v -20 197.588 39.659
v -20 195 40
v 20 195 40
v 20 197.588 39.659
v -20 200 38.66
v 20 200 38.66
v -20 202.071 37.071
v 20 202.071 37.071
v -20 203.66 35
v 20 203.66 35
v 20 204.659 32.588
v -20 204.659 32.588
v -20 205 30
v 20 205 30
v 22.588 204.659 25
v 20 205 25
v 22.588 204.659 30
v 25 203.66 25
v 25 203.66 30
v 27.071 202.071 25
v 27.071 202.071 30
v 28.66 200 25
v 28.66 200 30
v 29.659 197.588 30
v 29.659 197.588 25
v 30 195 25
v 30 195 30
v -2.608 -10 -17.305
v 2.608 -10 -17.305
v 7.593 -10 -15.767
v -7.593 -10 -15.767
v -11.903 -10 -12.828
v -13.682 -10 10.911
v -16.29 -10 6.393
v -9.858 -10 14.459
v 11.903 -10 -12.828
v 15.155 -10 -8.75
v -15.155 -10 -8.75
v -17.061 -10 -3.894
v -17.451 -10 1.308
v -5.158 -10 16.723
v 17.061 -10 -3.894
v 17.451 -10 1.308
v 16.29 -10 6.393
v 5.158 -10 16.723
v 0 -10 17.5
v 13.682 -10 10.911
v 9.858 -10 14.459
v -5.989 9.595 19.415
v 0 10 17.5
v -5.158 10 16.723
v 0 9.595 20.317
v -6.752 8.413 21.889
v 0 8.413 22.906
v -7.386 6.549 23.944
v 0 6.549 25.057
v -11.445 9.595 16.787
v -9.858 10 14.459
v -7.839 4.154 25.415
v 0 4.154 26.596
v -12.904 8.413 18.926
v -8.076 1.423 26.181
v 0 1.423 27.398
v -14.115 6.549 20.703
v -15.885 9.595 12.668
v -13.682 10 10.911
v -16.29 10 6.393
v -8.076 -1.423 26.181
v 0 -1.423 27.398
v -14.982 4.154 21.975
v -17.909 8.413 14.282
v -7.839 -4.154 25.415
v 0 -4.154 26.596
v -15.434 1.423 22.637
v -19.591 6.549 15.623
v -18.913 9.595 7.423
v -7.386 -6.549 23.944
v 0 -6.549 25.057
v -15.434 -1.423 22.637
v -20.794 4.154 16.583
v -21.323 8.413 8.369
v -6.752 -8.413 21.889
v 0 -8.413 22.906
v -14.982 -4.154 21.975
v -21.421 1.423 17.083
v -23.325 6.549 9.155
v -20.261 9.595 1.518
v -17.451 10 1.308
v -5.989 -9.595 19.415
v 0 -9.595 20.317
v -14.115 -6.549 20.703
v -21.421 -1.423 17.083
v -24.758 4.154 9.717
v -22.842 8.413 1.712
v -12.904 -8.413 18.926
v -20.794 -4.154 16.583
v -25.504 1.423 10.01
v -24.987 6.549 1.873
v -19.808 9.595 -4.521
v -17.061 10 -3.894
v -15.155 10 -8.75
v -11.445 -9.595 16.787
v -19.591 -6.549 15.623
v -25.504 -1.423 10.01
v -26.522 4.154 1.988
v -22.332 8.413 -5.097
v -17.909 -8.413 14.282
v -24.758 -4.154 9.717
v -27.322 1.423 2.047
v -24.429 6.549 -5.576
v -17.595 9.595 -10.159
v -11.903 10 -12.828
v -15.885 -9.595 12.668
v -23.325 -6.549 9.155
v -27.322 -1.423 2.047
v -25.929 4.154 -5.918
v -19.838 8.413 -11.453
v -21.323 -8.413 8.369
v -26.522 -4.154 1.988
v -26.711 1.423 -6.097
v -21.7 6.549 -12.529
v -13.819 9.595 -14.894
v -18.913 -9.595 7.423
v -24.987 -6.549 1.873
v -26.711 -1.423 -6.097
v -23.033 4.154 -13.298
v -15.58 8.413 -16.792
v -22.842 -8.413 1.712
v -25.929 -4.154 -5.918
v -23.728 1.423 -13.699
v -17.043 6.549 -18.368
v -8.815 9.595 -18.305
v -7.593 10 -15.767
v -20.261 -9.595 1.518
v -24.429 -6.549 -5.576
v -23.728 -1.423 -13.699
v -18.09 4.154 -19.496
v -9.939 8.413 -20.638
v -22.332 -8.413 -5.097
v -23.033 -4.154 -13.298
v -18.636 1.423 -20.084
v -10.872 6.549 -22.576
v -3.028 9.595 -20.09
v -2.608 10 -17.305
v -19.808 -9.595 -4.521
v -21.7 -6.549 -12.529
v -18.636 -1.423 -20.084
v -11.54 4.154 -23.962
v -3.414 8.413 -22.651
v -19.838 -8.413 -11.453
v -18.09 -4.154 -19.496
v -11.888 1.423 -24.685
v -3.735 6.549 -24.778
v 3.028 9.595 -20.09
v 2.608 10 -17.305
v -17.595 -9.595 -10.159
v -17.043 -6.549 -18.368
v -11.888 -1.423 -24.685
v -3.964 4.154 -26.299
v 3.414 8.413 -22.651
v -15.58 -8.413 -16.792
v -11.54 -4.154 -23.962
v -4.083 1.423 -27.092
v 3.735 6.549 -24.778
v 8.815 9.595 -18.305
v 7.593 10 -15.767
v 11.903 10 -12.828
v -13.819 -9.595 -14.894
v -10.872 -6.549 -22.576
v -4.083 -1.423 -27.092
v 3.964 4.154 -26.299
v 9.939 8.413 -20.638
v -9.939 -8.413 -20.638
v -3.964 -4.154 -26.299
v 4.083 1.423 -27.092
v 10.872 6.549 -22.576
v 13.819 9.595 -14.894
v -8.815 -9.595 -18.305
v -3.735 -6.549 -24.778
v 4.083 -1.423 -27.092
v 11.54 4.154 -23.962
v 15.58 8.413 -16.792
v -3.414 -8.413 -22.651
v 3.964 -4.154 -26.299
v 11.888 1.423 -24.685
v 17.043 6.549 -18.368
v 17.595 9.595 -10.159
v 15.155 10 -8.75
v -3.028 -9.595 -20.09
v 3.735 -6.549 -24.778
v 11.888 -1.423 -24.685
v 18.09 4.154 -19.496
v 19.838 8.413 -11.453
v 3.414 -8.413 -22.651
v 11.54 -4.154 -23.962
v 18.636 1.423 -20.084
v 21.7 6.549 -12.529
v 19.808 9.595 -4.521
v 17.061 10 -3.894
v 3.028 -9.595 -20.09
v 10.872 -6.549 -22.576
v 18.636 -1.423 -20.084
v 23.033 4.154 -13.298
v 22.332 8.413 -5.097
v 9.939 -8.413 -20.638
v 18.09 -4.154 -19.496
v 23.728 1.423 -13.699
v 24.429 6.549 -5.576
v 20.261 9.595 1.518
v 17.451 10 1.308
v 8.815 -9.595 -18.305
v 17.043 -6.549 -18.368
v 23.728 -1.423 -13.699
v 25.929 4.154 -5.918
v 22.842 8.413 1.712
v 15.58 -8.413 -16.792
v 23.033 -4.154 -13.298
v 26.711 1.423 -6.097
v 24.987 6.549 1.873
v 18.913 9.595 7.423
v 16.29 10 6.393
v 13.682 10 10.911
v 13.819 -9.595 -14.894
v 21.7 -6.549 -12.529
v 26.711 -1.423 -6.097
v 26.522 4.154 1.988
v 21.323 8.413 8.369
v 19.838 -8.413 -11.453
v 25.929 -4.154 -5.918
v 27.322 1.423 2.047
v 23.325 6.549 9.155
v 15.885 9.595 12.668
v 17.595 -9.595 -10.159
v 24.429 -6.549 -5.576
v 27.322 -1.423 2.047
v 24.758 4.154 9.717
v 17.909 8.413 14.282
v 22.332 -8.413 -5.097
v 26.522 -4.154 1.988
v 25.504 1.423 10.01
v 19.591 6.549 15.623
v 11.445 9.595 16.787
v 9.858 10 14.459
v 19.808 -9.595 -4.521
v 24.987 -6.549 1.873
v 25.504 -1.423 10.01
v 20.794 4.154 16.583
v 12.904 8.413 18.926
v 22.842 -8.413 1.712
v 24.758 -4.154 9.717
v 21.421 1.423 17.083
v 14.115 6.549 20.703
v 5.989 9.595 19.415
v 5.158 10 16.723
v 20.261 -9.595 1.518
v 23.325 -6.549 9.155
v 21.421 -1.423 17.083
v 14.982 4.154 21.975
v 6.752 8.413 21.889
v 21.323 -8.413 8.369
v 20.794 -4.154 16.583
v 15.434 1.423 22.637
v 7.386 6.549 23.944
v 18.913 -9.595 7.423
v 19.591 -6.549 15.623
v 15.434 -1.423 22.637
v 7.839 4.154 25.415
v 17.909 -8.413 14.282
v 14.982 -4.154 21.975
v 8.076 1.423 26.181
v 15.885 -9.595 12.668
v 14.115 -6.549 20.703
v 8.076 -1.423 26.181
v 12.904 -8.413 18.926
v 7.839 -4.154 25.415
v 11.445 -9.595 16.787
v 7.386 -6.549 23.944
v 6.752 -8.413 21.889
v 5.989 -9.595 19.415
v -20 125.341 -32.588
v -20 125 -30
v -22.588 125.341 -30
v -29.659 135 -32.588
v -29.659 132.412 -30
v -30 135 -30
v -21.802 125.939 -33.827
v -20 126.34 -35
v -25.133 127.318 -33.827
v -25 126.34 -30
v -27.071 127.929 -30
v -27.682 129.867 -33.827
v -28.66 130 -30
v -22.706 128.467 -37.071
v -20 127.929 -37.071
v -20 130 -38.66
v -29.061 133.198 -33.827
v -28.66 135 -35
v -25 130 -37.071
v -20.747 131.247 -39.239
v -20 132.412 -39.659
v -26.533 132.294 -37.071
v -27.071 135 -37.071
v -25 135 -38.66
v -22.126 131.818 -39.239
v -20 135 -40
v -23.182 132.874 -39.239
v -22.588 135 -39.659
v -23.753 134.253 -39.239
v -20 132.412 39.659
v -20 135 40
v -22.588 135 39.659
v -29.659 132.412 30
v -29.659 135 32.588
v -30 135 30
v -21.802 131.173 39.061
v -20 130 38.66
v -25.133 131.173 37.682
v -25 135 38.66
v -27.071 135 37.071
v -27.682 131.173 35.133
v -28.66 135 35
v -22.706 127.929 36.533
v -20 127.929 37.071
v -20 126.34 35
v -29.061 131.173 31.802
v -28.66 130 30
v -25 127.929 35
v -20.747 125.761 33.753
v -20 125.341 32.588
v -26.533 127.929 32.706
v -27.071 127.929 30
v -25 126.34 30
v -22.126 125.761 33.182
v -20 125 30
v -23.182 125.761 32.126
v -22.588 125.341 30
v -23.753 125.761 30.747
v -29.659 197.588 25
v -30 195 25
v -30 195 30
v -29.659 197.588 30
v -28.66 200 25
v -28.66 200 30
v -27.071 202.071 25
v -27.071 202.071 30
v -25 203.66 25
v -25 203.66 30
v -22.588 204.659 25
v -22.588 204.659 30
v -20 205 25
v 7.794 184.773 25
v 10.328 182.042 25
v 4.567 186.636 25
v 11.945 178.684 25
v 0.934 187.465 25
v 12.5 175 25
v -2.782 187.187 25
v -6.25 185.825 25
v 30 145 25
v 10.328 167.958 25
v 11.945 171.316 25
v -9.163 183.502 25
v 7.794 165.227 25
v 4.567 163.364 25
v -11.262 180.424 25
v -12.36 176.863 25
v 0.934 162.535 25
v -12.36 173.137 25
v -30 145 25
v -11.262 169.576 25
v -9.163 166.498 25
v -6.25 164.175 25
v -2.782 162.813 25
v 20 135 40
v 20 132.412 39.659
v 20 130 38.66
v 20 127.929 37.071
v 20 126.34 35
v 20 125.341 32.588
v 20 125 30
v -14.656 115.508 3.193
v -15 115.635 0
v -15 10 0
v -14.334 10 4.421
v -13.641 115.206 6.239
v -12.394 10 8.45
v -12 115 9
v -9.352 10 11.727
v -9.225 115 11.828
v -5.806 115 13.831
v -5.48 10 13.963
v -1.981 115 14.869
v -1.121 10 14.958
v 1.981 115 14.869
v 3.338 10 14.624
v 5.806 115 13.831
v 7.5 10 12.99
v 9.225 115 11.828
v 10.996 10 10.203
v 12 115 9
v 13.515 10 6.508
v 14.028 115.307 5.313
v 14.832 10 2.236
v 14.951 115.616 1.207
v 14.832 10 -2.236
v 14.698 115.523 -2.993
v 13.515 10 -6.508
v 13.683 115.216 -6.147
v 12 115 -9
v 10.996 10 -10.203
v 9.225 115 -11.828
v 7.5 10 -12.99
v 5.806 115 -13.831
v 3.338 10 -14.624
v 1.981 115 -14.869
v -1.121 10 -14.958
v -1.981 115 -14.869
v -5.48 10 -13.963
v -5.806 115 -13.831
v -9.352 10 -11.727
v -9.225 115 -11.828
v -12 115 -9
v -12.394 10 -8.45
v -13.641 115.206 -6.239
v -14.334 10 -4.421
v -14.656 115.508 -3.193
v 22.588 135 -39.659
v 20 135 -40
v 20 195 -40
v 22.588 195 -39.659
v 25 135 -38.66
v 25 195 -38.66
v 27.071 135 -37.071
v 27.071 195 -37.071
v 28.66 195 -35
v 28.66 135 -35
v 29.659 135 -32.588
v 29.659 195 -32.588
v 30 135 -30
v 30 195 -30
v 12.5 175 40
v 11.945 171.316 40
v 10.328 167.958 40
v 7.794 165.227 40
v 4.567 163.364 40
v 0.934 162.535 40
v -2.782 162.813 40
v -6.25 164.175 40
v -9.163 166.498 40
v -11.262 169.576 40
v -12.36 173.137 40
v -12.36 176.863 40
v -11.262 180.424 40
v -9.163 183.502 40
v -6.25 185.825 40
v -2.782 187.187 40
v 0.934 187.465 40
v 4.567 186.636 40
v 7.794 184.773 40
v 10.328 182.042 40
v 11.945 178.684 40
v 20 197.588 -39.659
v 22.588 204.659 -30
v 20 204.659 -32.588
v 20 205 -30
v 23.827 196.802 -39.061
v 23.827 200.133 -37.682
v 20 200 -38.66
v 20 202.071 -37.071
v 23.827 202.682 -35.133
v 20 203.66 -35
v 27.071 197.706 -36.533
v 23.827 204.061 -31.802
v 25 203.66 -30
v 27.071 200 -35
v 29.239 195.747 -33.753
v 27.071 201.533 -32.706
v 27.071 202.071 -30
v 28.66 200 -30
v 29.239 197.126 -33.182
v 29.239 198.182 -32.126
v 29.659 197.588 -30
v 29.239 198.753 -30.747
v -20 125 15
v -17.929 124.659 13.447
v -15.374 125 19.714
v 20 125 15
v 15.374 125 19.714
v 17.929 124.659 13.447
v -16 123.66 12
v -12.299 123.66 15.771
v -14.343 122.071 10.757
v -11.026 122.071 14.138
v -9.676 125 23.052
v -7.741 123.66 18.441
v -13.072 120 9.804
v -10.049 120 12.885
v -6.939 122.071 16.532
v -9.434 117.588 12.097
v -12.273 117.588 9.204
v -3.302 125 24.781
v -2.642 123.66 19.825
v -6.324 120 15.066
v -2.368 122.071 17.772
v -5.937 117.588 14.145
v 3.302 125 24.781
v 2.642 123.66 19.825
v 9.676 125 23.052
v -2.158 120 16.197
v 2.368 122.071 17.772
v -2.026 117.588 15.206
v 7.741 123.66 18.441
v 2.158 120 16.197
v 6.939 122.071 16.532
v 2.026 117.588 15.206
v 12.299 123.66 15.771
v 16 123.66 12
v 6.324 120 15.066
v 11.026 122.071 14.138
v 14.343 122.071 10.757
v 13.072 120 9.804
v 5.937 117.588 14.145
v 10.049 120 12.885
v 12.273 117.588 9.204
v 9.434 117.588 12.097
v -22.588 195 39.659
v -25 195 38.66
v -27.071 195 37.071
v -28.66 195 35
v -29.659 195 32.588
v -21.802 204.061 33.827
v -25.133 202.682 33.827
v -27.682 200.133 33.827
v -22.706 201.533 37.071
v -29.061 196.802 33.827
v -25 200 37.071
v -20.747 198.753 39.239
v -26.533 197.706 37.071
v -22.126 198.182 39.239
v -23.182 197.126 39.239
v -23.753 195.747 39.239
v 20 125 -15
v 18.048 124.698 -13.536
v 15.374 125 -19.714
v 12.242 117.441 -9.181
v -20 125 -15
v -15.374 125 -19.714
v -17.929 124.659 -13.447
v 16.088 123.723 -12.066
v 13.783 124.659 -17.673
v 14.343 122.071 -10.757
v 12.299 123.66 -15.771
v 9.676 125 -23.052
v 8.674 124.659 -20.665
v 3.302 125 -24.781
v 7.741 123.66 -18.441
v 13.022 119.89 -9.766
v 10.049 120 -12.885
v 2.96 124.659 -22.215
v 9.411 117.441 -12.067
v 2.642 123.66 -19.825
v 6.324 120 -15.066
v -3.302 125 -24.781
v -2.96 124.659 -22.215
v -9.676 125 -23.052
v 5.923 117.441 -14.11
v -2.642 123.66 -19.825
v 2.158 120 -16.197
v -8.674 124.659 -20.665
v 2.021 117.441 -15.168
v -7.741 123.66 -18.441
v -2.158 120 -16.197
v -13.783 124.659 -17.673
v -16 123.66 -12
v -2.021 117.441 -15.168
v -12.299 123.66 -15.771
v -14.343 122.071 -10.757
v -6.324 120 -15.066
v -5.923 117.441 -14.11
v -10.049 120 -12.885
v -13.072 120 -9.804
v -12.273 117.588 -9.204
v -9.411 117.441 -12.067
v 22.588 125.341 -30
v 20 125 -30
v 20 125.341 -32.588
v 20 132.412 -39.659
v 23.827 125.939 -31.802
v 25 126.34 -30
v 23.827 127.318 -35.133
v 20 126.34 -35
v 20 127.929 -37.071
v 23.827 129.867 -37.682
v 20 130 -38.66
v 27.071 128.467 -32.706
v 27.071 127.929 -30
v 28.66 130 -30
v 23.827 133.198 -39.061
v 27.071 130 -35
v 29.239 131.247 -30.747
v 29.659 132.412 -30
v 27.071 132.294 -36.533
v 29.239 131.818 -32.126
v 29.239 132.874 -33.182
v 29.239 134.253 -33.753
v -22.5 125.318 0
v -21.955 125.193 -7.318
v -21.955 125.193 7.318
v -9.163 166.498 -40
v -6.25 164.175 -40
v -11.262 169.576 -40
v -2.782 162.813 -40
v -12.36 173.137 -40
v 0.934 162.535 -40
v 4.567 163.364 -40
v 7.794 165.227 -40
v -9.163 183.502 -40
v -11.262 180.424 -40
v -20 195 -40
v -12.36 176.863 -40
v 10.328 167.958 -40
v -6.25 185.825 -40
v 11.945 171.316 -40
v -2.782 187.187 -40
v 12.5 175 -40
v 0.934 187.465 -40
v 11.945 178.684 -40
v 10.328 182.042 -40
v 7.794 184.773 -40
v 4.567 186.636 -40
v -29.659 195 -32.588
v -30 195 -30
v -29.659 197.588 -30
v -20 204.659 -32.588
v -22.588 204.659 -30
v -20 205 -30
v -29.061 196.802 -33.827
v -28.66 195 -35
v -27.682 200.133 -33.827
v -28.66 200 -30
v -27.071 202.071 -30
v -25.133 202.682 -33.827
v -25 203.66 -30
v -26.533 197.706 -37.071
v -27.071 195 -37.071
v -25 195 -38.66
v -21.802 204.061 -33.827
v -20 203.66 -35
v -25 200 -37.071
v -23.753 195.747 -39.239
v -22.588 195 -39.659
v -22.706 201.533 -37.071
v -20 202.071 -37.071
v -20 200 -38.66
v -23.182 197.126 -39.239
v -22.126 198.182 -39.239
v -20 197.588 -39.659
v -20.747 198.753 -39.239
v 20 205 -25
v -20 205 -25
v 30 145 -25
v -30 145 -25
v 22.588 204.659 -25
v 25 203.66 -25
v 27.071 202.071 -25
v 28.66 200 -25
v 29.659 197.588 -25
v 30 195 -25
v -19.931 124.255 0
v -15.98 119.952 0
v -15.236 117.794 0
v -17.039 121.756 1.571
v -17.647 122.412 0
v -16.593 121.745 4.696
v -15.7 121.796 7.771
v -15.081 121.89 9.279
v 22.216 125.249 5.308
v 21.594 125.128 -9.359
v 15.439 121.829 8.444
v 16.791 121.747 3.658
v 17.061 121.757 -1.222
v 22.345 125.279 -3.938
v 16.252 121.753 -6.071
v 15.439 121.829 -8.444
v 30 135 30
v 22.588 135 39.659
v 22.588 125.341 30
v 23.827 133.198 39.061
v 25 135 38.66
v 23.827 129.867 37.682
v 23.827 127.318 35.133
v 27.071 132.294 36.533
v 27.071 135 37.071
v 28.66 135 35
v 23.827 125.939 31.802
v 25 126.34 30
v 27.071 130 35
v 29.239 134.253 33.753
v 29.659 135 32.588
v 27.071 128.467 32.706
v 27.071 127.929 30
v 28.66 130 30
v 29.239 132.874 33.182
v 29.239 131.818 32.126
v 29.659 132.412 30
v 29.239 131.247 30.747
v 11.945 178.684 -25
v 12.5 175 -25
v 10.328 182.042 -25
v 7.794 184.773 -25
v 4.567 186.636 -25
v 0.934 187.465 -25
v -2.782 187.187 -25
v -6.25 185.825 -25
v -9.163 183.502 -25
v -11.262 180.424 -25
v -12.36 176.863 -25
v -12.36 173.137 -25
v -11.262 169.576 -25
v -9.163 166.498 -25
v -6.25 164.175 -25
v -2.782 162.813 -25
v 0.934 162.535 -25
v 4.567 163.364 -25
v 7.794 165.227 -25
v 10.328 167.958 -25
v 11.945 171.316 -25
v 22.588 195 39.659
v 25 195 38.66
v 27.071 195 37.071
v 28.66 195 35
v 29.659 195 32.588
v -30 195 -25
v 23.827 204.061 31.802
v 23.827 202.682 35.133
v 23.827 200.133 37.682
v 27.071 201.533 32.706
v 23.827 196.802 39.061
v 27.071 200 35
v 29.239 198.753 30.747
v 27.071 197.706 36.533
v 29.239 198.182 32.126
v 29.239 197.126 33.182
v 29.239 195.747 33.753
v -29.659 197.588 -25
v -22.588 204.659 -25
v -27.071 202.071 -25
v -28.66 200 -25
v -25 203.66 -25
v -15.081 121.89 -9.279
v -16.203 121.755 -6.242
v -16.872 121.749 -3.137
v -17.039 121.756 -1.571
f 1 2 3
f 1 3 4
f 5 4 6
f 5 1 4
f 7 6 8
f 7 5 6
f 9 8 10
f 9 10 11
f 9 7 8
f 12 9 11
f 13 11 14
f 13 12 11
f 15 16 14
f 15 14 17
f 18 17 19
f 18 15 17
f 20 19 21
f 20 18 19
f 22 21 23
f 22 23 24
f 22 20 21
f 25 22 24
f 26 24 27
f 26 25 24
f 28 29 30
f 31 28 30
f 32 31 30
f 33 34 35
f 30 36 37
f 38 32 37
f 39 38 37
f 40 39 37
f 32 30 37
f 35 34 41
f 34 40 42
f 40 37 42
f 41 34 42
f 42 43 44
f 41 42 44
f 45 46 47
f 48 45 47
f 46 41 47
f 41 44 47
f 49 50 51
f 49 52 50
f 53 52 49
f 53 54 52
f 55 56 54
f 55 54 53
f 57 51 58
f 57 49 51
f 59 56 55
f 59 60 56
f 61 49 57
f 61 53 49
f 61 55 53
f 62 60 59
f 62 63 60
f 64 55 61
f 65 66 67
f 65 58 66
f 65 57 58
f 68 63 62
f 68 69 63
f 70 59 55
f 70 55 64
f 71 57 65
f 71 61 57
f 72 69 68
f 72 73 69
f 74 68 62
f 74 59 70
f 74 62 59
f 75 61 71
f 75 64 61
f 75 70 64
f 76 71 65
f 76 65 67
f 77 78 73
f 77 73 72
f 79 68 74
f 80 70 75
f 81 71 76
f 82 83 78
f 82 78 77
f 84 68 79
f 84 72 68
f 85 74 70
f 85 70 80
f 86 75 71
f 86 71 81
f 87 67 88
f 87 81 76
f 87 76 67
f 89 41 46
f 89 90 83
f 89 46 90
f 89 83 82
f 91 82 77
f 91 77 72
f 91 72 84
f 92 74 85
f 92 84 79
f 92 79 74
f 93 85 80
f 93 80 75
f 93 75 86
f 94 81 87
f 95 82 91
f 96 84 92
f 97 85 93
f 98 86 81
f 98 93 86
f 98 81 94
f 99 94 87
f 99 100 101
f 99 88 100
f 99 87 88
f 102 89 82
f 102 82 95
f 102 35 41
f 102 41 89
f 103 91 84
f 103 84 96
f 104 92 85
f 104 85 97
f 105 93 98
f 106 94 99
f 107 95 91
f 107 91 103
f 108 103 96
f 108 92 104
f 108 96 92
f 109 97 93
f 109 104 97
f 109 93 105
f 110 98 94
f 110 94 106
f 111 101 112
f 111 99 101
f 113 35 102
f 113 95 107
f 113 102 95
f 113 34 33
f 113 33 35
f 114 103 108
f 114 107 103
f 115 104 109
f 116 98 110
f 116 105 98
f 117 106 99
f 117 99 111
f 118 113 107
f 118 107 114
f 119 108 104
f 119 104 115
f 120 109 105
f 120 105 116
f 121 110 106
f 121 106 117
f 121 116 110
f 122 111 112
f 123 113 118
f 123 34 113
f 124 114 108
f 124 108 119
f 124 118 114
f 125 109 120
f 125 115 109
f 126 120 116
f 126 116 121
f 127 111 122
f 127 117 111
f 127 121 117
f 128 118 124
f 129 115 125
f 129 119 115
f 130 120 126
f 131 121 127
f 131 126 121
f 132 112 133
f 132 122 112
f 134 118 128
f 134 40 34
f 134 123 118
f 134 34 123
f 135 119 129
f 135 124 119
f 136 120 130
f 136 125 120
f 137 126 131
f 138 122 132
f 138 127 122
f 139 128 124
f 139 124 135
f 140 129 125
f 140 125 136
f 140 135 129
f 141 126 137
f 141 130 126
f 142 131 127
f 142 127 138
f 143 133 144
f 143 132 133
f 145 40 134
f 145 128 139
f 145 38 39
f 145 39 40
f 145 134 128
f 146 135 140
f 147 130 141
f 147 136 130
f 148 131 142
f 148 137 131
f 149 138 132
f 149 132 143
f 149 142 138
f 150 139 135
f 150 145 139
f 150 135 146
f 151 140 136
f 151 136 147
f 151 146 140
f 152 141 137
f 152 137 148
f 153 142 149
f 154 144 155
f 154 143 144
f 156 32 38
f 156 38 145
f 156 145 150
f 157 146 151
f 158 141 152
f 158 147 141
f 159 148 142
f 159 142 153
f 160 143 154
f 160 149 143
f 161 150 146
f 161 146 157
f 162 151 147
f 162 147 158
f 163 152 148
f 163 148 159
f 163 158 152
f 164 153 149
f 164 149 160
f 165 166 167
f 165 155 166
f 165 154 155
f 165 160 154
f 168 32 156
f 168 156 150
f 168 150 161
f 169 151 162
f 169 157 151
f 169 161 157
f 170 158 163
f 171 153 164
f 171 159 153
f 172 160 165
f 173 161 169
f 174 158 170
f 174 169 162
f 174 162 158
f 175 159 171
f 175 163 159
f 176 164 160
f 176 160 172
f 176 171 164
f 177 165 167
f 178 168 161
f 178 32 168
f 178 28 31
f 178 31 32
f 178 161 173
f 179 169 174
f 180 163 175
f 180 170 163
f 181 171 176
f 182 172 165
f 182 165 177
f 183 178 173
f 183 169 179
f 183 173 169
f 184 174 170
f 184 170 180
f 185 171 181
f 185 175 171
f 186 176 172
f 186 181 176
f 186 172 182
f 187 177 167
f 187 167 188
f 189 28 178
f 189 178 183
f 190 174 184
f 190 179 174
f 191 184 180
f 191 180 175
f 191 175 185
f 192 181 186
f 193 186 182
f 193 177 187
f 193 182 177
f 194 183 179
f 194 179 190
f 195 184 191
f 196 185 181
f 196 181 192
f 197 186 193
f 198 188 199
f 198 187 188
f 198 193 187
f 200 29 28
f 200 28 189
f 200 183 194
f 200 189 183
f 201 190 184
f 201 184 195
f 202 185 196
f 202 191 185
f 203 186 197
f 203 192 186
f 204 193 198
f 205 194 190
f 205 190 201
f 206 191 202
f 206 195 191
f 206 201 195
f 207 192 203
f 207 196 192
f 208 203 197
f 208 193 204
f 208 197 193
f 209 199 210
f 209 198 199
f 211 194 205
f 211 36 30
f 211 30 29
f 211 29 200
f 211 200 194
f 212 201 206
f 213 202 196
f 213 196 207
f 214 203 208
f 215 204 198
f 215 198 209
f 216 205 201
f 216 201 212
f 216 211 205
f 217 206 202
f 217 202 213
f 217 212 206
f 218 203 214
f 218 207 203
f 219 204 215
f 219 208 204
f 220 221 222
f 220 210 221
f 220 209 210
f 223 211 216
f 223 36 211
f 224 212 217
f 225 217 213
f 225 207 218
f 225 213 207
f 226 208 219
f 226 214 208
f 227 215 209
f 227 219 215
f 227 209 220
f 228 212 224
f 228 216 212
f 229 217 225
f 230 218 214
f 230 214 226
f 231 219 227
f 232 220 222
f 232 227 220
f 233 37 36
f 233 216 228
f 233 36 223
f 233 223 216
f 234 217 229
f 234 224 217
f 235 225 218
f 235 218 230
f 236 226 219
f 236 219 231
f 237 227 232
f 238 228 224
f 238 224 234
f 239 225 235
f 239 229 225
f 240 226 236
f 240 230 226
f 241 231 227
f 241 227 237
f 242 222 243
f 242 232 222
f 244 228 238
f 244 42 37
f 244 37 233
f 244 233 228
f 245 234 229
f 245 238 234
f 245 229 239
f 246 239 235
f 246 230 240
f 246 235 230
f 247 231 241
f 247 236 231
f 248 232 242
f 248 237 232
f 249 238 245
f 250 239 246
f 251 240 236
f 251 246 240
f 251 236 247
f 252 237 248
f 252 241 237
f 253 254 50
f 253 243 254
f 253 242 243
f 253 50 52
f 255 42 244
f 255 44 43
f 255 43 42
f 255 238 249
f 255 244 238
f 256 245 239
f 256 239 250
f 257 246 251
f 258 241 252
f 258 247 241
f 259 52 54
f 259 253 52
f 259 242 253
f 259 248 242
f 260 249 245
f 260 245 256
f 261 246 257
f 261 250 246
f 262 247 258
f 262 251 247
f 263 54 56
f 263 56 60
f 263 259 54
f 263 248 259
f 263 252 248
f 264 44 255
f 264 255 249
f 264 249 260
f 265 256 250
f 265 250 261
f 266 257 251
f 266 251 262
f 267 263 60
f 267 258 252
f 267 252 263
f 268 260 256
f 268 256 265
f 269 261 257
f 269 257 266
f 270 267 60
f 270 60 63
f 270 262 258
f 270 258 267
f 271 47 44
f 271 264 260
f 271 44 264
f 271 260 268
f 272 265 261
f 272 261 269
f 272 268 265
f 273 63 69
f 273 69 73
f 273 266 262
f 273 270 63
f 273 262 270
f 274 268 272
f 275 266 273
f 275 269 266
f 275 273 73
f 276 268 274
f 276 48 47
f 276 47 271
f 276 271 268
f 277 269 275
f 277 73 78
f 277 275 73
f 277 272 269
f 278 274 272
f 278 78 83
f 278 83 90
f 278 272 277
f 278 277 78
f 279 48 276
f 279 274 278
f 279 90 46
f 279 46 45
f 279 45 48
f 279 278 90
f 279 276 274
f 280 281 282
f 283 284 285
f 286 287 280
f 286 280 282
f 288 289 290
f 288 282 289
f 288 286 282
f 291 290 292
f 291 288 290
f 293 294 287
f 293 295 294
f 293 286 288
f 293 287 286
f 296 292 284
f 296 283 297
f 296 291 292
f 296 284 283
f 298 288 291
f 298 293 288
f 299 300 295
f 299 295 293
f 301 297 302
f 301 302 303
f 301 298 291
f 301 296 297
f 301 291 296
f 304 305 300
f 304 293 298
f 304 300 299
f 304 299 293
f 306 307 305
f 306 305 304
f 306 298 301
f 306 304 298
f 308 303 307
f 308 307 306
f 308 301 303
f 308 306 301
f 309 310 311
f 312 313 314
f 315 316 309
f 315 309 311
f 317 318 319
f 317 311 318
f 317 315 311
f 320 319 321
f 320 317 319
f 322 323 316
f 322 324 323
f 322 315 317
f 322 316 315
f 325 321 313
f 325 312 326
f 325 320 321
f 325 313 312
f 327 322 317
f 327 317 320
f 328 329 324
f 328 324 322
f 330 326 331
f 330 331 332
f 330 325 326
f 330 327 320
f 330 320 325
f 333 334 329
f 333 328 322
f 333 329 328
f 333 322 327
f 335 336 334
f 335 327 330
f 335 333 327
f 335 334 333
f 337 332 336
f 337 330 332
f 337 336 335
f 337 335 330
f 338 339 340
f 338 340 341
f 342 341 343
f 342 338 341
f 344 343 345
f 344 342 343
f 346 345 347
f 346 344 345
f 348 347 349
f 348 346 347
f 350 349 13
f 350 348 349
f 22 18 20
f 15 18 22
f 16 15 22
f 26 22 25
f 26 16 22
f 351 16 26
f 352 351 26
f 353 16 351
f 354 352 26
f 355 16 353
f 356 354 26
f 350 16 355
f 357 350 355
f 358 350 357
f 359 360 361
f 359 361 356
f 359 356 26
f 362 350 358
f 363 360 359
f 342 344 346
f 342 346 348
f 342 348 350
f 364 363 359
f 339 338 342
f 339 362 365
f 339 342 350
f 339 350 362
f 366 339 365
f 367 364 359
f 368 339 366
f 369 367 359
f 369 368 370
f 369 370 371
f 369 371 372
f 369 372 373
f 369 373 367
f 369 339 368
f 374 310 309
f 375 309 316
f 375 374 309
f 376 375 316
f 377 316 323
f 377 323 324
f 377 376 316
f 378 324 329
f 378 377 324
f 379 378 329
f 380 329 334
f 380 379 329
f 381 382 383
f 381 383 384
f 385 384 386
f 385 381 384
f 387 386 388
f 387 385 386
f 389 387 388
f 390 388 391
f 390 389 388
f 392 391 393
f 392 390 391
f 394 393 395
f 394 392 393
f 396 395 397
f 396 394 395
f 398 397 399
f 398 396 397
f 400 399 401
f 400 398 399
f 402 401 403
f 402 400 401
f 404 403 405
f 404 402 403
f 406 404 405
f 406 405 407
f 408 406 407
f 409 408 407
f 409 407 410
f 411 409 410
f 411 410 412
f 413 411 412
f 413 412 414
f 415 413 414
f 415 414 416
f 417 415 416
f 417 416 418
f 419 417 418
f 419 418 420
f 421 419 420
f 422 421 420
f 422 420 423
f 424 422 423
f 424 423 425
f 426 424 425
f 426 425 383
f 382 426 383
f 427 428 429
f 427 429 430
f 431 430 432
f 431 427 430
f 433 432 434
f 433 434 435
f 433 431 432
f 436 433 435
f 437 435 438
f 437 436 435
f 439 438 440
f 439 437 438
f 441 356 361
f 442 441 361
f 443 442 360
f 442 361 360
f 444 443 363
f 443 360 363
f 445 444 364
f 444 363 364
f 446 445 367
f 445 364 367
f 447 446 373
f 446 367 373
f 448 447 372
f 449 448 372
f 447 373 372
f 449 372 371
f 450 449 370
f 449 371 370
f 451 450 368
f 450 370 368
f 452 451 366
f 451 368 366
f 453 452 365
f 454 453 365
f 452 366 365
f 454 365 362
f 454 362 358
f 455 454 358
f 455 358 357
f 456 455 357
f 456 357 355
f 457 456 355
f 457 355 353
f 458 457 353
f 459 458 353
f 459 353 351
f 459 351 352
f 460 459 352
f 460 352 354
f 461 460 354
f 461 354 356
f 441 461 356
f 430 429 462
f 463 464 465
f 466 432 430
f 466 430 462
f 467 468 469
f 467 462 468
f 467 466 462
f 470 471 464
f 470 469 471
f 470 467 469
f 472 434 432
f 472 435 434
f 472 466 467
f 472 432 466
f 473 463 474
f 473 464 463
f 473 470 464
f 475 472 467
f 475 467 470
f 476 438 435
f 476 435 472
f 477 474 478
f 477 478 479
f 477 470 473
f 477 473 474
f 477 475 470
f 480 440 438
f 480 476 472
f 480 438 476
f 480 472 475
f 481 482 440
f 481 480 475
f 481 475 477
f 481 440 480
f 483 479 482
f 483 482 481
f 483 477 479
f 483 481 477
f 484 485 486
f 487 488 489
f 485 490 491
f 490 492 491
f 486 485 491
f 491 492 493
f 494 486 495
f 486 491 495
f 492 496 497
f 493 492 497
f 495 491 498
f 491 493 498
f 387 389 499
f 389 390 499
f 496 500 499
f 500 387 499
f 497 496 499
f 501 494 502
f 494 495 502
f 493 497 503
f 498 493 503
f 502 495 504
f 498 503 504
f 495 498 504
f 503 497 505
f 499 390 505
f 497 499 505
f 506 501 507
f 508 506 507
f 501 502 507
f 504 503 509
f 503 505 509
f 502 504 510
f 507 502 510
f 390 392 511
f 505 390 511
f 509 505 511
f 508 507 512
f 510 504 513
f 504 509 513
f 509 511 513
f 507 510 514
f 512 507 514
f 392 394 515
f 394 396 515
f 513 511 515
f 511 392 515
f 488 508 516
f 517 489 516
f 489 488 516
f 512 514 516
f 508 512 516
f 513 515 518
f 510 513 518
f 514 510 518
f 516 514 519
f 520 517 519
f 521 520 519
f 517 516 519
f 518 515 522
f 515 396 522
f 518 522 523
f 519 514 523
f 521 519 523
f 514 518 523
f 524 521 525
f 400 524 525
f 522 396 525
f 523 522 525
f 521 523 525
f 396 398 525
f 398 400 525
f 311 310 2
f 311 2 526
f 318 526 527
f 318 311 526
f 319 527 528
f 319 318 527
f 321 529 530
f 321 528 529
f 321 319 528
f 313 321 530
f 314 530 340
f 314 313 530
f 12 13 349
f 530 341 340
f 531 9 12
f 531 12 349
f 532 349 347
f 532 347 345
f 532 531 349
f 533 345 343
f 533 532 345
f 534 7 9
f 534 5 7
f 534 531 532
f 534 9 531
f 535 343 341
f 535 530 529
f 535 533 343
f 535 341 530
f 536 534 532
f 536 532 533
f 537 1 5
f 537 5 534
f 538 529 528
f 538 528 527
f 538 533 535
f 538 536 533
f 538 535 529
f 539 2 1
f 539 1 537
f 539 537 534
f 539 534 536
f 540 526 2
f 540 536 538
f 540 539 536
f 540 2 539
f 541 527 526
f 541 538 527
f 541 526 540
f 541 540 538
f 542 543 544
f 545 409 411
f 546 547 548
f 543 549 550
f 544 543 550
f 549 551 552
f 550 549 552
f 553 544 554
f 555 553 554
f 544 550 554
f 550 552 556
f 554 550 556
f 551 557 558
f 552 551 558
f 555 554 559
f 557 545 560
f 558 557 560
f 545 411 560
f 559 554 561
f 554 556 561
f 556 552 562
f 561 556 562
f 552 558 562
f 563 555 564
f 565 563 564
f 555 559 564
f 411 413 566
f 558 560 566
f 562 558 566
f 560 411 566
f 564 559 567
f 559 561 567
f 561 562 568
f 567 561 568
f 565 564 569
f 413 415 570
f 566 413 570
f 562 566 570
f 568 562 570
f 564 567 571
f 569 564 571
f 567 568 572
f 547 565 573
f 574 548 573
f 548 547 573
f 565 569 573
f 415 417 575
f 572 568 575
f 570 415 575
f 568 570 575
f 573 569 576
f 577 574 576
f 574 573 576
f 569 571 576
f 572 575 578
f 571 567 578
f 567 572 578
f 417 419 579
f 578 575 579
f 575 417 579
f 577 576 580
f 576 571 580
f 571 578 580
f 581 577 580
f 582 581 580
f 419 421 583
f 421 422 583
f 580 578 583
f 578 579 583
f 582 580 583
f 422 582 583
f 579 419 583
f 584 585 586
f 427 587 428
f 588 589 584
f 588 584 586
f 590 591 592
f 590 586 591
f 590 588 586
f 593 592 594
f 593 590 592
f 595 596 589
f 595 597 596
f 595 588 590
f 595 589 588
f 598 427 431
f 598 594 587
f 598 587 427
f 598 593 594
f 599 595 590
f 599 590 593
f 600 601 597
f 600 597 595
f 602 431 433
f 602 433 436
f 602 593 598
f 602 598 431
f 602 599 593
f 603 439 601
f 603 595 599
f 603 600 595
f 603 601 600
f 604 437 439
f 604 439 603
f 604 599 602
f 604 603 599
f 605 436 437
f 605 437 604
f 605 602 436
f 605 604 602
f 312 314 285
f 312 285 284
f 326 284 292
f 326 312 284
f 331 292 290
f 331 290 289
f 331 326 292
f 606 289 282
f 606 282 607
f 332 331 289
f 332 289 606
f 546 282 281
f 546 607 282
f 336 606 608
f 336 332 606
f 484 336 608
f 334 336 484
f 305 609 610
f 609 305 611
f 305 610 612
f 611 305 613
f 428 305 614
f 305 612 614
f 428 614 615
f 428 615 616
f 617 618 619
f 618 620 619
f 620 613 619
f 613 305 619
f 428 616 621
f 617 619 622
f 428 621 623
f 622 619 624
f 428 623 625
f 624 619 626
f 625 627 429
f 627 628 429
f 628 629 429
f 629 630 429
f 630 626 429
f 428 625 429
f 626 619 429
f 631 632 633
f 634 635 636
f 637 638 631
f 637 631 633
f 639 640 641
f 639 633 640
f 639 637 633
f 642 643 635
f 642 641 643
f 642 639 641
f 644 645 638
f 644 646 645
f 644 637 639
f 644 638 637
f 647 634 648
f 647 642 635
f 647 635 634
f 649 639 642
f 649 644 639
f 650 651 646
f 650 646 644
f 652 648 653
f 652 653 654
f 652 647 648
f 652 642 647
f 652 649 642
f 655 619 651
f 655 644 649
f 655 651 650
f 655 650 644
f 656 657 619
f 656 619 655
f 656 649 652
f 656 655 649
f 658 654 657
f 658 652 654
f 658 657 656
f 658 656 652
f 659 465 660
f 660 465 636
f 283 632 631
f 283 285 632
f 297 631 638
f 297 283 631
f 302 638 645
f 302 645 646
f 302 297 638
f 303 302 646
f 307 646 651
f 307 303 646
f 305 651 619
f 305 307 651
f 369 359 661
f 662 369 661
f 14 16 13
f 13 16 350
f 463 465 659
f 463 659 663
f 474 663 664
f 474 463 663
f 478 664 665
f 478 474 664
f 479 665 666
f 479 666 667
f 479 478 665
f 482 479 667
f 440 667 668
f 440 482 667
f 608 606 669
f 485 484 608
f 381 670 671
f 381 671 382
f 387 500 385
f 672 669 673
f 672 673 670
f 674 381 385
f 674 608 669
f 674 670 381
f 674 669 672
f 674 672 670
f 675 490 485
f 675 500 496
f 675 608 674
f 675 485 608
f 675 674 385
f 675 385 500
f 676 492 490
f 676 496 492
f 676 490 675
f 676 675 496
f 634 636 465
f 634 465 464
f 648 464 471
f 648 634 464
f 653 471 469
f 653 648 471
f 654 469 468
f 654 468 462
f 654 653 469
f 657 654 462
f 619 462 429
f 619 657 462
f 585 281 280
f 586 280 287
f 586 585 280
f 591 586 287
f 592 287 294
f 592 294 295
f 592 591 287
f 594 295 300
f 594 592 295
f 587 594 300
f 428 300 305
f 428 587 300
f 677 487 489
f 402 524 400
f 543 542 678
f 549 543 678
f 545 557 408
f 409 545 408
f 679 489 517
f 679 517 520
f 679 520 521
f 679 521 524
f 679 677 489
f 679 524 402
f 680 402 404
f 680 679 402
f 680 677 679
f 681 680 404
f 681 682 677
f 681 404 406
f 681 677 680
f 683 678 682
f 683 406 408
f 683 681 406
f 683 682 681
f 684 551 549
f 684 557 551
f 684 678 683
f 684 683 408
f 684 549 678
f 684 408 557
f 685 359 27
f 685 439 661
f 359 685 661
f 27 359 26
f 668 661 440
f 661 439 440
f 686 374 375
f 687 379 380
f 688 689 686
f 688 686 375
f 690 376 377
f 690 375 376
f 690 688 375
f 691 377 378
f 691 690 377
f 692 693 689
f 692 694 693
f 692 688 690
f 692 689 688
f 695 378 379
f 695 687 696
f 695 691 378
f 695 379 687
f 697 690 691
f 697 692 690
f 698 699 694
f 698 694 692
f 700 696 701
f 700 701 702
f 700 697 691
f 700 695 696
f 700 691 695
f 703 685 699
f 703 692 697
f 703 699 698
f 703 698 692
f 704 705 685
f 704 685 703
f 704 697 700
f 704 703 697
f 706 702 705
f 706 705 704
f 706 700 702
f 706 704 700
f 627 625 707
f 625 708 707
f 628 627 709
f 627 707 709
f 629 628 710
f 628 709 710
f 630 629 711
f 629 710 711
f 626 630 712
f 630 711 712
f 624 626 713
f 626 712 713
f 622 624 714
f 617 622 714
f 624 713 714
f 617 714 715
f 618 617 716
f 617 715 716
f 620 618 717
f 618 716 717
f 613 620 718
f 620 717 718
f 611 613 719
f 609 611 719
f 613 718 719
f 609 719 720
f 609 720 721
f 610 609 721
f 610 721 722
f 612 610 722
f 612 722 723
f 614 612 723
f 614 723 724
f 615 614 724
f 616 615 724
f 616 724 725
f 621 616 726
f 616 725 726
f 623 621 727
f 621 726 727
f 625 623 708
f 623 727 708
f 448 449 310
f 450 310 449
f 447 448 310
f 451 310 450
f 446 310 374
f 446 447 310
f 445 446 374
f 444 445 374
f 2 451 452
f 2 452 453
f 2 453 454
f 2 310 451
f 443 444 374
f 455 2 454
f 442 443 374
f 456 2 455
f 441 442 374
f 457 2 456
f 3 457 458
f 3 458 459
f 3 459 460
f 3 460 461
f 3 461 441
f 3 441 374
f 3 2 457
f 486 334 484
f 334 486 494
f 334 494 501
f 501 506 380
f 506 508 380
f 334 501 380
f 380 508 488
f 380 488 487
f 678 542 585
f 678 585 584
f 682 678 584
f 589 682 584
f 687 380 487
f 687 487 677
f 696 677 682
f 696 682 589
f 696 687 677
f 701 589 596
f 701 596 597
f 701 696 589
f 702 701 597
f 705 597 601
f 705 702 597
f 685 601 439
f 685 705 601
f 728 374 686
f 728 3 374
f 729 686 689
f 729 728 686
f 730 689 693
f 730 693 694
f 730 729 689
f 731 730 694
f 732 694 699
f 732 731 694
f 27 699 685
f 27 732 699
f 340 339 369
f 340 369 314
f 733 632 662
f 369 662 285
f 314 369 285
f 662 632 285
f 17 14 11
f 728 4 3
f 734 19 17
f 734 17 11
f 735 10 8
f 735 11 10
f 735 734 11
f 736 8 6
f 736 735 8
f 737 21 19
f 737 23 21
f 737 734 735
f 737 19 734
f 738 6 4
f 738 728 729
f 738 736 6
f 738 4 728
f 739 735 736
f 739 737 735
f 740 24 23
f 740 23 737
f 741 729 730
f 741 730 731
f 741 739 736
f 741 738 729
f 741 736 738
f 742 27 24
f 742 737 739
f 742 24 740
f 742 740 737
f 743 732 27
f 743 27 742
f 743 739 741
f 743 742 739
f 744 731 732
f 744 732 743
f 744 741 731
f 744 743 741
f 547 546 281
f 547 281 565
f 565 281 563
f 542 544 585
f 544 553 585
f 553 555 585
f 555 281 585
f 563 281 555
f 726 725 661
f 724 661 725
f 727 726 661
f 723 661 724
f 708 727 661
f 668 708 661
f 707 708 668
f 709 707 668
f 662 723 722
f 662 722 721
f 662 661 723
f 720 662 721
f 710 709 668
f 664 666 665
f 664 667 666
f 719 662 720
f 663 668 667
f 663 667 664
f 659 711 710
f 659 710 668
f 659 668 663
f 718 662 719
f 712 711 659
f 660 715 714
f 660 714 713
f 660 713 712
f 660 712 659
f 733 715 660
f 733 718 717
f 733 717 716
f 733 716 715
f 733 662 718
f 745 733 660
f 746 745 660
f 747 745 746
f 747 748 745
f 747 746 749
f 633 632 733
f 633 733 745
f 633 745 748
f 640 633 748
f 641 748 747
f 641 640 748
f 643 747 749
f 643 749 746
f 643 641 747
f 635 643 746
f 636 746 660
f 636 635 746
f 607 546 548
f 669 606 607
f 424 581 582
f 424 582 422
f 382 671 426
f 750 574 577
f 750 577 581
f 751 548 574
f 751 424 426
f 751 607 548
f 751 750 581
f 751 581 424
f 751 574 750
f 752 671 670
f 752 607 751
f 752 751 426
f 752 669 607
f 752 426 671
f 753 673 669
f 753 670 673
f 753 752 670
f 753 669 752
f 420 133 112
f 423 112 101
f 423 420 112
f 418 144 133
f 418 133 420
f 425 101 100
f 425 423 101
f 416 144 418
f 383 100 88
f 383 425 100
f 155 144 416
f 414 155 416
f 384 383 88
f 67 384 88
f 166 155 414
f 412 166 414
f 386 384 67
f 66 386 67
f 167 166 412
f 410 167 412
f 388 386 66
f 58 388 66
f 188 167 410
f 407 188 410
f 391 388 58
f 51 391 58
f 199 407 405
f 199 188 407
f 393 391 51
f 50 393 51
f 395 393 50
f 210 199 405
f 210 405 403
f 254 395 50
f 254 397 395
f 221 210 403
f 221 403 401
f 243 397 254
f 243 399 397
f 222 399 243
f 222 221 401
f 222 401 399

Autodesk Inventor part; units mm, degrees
ref_plane "YZ Plane" through (0, 0, 0) normal (1, 0, 0) x (0, 1, 0)
ref_plane "XZ Plane" through (0, 0, 0) normal (0, 1, 0) x (-1, 0, 0)
ref_plane "XY Plane" through (0, 0, 0) normal (0, 0, 1) x (1, 0, 0)
sketch "Sketch1" plane through (0, 0, 0) normal (0, 0, 1) x (1, 0, 0)
  line L0 (0, 0) -> (0, 125)
  dimension "d0" = 125
sketch "Sketch2" plane through (0, 0, 0) normal (0, 1, 0) x (-1, 0, 0)
  circle A0 centre (0, 0) radius 15
  dimension "d3" = 30
sweep "Sweep1" add profiles "Sketch2" path "Sketch1"
sketch "Sketch4" plane through (0, 0, 0) normal (1, 0, 0) x (0, 1, 0)
  line L0 (0, 17.5) -> (0, -17.5) construction
  line L1 (10, 17.5) -> (10, -17.5)
  line L2 (-10, -17.5) -> (-10, 17.5)
  arc A0 (10, 17.5) -> (-10, 17.5) centre (0, 17.5) ccw
  arc A1 (-10, -17.5) -> (10, -17.5) centre (0, -17.5) ccw
  line L3 (-10, 0) -> (10, 0)
  point P0 (0, 0)
  dimension "d9" = 35
  dimension "d10" = 10
revolve "Revolution1" add sketch "Sketch4" angle 360 about axis through (0, -10, 0) along (0, 1, 0) contours L1 L3 L2 A0
sketch "Sketch5" plane through (0, 0, 0) normal (0, 0, 1) x (1, 0, 0)
  line L0 (-30, 125) -> (30, 125)
  line L1 (30, 125) -> (30, 205)
  line L2 (30, 205) -> (-30, 205)
  line L3 (-30, 205) -> (-30, 125)
  circle A0 centre (0, 175) radius 12.5
  line L4 (0, 0) -> (0, 125) construction
  line L5 (0, 175) -> (0, 125)
  dimension "d12" = 175
  dimension "d13" = 25
  dimension "d14" = 60
  dimension "d15" = 30
extrude "Extrusion1" add sketch "Sketch5" along normal mid plane 80
sketch "Sketch7" plane through (-30, 125, 40) normal (-1, 0, 0) x (0, 0, 1)
  line L0 (-80, 80) -> (0, 80) construction
  line L1 (-65, 80) -> (-15, 80)
  line L2 (-15, 80) -> (-15, 20)
  line L3 (-15, 20) -> (-65, 20)
  line L4 (-65, 20) -> (-65, 80)
  line L5 (-80, 37.5) -> (-80, 62.5) construction
  line L6 (0, 62.5) -> (0, 37.5) construction
  line L7 (-80, 0) -> (-80, 80) construction
  line L8 (-80, 50) -> (0, 50) construction
  line L9 (0, 80) -> (0, 0) construction
  line L10 (-40, 50) -> (-40, 0) construction
  point P0 (-40, -125)
  dimension "d18" = 30
  dimension "d19" = 50
  dimension "d20" = 25
  dimension "d21" = 175
fillet "Fillet1" radius 10 13 edges at (-30, 165, 40) (30, 165, 40) (-30, 165, -40) (30, 165, -40) (-30, 125, 0) (0, 125, -40) (0, 125, 40) (30, 125, 0) (15, 125, 0) (-30, 205, 0) (0, 205, 40) (30, 205, 0) (0, 205, -40)
extrude "Extrusion2" cut sketch "Sketch7" against normal through all
equation "\"d20\" = 0.5 * d19"
equation "\"d21\" = d12"
properties part number "Elo-Bola Longo"
